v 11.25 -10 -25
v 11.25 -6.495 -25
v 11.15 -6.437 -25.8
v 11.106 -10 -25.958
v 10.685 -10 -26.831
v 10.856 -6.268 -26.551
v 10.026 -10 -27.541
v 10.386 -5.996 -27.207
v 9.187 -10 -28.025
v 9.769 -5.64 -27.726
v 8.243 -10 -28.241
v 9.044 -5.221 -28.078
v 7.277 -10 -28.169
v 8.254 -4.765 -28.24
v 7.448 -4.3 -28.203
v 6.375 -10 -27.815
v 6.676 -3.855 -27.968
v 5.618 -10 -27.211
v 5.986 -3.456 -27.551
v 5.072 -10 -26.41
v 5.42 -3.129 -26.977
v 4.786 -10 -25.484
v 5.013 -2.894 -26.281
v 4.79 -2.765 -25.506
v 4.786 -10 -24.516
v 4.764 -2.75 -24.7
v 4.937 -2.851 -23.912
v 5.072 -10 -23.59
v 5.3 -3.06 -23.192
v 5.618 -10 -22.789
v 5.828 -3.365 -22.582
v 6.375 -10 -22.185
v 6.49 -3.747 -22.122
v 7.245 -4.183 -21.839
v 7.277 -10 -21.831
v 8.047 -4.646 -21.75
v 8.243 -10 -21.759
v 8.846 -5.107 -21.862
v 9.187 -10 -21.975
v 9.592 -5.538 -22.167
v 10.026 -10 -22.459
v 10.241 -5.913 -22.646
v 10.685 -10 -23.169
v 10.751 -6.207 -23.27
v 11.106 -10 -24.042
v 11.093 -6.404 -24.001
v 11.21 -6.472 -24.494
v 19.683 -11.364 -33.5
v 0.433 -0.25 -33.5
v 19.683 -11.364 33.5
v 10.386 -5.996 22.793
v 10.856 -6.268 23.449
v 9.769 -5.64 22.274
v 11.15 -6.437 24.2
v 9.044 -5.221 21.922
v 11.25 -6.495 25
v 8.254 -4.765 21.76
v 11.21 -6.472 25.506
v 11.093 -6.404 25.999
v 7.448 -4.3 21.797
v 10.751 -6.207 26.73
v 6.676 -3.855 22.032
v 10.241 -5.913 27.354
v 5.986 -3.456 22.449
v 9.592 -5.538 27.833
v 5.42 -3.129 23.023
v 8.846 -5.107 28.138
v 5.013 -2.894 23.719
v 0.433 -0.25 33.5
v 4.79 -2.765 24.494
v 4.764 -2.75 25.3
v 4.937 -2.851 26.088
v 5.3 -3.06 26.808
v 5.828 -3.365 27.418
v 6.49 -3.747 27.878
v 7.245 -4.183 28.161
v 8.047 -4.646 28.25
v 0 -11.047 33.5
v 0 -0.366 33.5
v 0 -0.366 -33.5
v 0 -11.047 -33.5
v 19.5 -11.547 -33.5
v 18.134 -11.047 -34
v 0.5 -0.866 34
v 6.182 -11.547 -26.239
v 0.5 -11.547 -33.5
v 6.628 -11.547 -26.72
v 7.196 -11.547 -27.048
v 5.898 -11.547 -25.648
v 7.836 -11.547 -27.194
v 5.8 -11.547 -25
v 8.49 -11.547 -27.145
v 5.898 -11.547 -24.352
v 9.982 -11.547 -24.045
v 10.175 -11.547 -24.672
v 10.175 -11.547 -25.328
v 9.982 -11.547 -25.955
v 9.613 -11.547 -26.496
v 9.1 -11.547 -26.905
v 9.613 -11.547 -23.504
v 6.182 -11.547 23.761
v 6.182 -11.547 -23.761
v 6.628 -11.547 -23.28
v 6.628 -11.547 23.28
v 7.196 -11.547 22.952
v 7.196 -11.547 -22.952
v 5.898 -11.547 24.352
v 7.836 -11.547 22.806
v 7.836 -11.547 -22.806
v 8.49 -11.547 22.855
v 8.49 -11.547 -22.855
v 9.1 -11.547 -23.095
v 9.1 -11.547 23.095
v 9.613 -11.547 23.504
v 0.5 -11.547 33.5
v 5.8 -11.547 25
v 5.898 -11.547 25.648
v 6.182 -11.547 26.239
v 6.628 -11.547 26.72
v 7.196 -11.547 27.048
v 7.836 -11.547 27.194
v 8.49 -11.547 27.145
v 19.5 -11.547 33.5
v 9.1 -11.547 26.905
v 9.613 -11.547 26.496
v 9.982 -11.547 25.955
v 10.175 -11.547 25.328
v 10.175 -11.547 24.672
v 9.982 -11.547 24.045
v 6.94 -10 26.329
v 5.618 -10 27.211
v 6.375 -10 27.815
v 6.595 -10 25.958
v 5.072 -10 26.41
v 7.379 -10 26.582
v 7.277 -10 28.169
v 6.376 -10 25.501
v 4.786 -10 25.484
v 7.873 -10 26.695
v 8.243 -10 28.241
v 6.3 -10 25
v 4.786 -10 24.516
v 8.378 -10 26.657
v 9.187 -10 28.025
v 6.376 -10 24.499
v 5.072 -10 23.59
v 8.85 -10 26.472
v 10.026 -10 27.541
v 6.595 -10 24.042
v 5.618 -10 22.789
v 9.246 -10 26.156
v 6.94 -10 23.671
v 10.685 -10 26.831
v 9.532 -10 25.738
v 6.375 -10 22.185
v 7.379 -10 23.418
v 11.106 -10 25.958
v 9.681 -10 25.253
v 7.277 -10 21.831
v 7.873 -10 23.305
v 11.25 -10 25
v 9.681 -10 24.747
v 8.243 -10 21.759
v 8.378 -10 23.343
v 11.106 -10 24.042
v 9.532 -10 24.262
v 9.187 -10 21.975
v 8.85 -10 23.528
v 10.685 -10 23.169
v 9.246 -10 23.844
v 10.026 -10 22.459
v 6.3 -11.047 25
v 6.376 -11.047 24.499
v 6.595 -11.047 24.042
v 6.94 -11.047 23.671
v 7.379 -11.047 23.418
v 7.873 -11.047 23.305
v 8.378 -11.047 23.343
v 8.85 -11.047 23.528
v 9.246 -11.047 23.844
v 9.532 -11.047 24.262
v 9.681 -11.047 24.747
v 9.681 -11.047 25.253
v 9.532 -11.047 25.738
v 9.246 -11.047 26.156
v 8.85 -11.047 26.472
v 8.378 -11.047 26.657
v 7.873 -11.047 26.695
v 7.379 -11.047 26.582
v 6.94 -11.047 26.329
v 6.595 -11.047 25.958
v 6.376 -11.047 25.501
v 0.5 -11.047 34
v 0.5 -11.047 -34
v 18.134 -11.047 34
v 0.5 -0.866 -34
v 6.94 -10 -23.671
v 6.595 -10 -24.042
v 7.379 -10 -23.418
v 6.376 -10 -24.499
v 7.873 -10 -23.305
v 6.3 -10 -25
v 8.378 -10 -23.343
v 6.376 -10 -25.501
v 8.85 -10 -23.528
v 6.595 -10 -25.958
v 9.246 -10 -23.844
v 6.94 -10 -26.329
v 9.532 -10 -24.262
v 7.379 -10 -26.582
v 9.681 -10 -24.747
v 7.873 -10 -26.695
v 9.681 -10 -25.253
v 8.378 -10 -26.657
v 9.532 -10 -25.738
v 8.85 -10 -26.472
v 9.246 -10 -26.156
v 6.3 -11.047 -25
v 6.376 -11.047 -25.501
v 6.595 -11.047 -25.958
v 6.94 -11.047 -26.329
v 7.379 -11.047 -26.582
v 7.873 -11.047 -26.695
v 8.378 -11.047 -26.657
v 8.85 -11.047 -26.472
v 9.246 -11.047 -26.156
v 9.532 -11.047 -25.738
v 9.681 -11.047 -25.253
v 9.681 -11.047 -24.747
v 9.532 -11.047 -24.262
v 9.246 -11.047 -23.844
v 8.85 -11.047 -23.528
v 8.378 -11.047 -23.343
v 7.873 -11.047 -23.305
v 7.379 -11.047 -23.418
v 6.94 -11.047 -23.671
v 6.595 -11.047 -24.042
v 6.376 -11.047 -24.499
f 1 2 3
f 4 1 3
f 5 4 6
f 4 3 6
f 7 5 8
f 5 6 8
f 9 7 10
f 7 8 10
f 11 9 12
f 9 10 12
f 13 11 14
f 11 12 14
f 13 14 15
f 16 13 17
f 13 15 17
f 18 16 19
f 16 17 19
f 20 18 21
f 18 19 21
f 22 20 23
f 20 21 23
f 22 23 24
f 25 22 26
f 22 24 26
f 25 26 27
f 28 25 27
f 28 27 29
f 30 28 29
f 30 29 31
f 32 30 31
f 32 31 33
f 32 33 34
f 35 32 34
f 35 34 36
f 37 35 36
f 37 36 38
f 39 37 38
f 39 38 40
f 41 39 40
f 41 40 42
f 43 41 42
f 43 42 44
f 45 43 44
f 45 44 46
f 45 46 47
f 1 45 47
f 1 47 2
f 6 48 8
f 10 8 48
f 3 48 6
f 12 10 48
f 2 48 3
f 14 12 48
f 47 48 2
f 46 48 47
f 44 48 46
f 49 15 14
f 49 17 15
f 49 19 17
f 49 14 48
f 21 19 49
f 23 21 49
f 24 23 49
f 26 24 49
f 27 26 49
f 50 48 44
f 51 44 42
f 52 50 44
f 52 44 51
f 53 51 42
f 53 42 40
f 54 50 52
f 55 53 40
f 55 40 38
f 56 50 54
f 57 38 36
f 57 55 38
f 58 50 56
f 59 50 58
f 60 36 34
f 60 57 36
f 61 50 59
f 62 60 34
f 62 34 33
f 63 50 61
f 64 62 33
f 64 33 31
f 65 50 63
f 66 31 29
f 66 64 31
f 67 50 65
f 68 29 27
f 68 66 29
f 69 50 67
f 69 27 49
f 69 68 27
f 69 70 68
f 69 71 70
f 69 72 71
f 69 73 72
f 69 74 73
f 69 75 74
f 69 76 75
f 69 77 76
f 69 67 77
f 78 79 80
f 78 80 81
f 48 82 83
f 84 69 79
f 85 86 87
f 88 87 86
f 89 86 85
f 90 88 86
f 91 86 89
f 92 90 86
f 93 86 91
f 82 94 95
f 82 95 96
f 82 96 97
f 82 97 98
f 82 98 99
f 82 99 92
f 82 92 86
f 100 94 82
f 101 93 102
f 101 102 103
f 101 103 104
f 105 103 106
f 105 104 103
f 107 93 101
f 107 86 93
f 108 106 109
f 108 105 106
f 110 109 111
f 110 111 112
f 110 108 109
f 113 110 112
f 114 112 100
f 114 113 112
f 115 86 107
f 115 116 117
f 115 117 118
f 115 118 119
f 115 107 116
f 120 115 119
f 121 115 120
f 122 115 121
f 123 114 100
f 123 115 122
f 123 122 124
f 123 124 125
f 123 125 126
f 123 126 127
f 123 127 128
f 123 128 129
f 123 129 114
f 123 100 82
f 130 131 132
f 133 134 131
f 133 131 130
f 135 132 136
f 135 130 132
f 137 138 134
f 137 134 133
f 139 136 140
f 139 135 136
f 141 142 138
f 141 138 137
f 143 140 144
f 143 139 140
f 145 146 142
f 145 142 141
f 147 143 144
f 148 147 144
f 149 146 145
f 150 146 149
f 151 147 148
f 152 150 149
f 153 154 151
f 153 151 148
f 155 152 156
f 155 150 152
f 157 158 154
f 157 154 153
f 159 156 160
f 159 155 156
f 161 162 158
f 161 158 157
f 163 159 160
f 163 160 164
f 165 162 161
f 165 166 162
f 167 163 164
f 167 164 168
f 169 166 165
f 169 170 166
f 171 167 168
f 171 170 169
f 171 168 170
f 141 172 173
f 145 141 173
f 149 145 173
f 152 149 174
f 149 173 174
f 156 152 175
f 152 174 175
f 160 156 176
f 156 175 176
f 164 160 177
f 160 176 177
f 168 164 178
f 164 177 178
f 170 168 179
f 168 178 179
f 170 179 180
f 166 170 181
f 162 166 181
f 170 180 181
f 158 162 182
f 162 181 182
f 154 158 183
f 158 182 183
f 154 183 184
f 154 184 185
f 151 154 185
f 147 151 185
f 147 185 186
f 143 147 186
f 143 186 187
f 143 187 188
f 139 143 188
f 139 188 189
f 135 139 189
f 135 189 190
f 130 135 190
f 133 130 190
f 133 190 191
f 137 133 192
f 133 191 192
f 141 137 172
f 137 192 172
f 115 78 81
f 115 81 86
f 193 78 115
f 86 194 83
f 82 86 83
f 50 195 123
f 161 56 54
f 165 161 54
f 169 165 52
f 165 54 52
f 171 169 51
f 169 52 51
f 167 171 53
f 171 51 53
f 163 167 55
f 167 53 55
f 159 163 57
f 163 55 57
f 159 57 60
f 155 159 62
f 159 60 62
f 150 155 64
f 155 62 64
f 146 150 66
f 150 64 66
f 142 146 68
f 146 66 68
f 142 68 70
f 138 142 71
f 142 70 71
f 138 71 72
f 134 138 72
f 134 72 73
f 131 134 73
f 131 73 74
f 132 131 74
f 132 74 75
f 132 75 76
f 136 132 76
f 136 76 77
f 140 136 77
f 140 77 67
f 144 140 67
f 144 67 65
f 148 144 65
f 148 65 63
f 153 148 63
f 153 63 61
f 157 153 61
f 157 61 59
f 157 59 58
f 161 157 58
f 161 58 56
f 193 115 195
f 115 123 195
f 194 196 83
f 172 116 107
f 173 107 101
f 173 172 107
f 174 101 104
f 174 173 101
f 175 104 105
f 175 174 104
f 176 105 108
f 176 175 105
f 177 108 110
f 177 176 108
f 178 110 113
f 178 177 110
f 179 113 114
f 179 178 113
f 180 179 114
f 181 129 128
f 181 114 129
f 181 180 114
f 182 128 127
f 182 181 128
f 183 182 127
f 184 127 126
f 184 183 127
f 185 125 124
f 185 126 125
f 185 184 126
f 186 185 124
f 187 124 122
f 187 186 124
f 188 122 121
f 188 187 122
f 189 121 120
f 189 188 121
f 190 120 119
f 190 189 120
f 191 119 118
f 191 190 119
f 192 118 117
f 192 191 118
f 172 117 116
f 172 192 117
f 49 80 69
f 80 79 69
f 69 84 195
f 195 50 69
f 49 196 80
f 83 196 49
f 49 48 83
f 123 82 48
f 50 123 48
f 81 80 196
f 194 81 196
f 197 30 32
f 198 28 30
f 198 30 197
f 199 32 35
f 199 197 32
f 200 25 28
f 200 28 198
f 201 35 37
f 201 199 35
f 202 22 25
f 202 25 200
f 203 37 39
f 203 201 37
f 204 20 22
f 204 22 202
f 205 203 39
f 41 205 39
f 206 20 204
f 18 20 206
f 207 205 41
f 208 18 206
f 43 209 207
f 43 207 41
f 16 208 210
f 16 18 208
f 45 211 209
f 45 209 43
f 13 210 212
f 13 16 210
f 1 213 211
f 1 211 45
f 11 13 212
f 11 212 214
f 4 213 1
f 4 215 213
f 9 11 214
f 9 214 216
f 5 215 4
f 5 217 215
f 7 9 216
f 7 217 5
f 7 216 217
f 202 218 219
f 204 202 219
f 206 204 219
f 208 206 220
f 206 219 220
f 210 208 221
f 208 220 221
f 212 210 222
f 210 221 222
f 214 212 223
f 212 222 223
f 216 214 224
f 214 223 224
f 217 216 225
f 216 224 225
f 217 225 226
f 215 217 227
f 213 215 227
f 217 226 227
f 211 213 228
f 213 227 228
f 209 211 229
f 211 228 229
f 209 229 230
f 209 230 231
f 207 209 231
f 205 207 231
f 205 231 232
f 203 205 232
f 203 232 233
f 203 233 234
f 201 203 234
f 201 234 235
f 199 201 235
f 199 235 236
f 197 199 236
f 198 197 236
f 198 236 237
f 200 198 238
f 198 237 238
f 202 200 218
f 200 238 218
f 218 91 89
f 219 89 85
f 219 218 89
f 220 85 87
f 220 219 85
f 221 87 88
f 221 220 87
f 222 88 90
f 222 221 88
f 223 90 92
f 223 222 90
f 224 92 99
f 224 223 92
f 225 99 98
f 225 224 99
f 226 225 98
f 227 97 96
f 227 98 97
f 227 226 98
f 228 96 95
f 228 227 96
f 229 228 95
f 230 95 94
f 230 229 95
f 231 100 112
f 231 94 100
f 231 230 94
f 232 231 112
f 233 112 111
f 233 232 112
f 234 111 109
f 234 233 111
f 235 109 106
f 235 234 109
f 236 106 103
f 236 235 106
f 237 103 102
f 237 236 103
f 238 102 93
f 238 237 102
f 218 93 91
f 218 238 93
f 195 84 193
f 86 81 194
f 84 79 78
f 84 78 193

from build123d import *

# Parameters (mm, degrees)
BOSS_EXTRUDE1_DEPTH                                 = 34
CBORE_FOR_M3_HEX_SOCKET_HEAD_CAP_SCREW1_D           = 3.4
CBORE_FOR_M3_HEX_SOCKET_HEAD_CAP_SCREW1_CBORE_D     = 6.5
CBORE_FOR_M3_HEX_SOCKET_HEAD_CAP_SCREW1_CBORE_DEPTH = 10


with BuildPart() as part:
    # Sketch1 → Boss-Extrude1 (new, symmetric)
    with BuildSketch(Plane.XY):
        Polygon((0, 0), (0, -11.547005384), (20, -11.547005384), align=None)
    extrude(amount=BOSS_EXTRUDE1_DEPTH, both=True)

    # CBORE for M3 Hex Socket Head Cap Screw1 (through all)
    with Locations(Plane(origin=(0, 0, 0), x_dir=(1, 0, 0), z_dir=(0, 1, 0))):
        with Locations((8, -25), (8, 25)):
            CounterBoreHole(CBORE_FOR_M3_HEX_SOCKET_HEAD_CAP_SCREW1_D / 2, CBORE_FOR_M3_HEX_SOCKET_HEAD_CAP_SCREW1_CBORE_D / 2, CBORE_FOR_M3_HEX_SOCKET_HEAD_CAP_SCREW1_CBORE_DEPTH)

    # Chamfer1
    # the kernel refuses this chamfer: 0.5, 0.366025404 mm, written as the material it takes off along each edge
    with BuildSketch(Plane(origin=(0.333333333, -11.21367205, 33.666666667), x_dir=(0.7071067811865475, -0.7071067811865476, 0), z_dir=(-0.5773502691896258, -0.5773502691896257, 0.5773502691896256)), Plane(origin=(0.333333333, -11.21367205, -33.666666667), x_dir=(0.7071067811865474, 0, -0.7071067811865476), z_dir=(-0.5773502691896258, -0.5773502691896257, -0.5773502691896257))) as chamfer1_piece_1:
        Polygon((-0.353553391, -0.204124145), (0.353553391, -0.204124145), (0, 0.40824829), align=None)
    extrude(amount=0.635085296, mode=Mode.SUBTRACT)
    with BuildSketch(Plane(origin=(19.105662433, -11.319334483, 33.666666667), x_dir=(-0.8880738339771186, 0.3250575836718637, 0.3250575836718637), z_dir=(0.25056280708572953, -0.2505628070857271, 0.9351131265310311))) as chamfer1_piece_2:
        Polygon((-0.478383292, 0.07914139), (1.059805709, 0.07914139), (-0.581422417, -0.15828278), align=None)
    extrude(amount=0.652121763, mode=Mode.SUBTRACT)
    with BuildSketch(Plane(origin=(19.105662433, -11.319334483, -33.666666667), x_dir=(0.8880738339771186, -0.3250575836718637, 0.3250575836718637), z_dir=(0.25056280708572953, -0.2505628070857271, -0.9351131265310311))) as chamfer1_piece_3:
        Polygon((-1.059805709, 0.07914139), (0.478383292, 0.07914139), (0.581422417, -0.15828278), align=None)
    extrude(amount=0.652121763, mode=Mode.SUBTRACT)
    with BuildSketch(Plane(origin=(0.311004234, -0.494016936, -33.666666667), x_dir=(0.5773502691896288, -0.5773502691896194, -0.5773502691896291), z_dir=(-0.16369153687076843, 0.6109051323707225, -0.7745966692414806))) as chamfer1_piece_4:
        Polygon((-0.349679369, 0.136409614), (0.516346035, 0.136409614), (-0.166666667, -0.272819228), align=None)
    extrude(amount=0.671995646, mode=Mode.SUBTRACT)
    with BuildSketch(Plane(origin=(0.311004234, -0.494016936, 33.666666667), x_dir=(0.5773502691896286, -0.5773502691896196, 0.5773502691896291), z_dir=(-0.1636915368707684, 0.6109051323707224, 0.7745966692414807))) as chamfer1_piece_5:
        Polygon((-0.349679369, -0.136409614), (0.516346035, -0.136409614), (-0.166666667, 0.272819228), align=None)
    extrude(amount=0.671995646, mode=Mode.SUBTRACT)
    with BuildSketch(Plane(origin=(-1.285841494, -11.547005384, 34), x_dir=(0, -0.02749587661058574, -0.9996219169112968), z_dir=(1, 0, 0)), Plane(origin=(-1.285841494, -11.547005384, -34), x_dir=(0, 0.999621916911297, -0.0274958766105822), z_dir=(1, 0, 0))) as chamfer1_piece_6:
        with BuildLine():
            Line((0.514336598, 0), (-0.028273577, 0.513558897))
            Line((-0.028273577, 0.513558897), (-0.038269797, 0.513283938))
            ThreePointArc((-0.038269797, 0.513283938), (-0.017064614, 0.256698915), (-0.009996219, -0.000274959))
            Line((-0.009996219, -0.000274959), (0.000274959, -0.009996219))
            ThreePointArc((0.000274959, -0.009996219), (0.257248832, -0.002927825), (0.514611556, -0.009996219))
            Line((0.514611556, -0.009996219), (0.514336598, 0))
        make_face()
    extrude(amount=22.571682988, mode=Mode.SUBTRACT)
    with BuildSketch(Plane(origin=(8, -11.547005384, -25), x_dir=(-1, 0, 0), z_dir=(0, 0, 1))) as chamfer1_piece_7:
        with BuildLine():
            Line((2.214142136, 0.014142136), (1.685857864, -0.514142136))
            Line((1.685857864, -0.514142136), (1.675857864, -0.514142136))
            ThreePointArc((1.675857864, -0.514142136), (1.69, -0.257071068), (1.69, 0))
            Line((1.69, 0), (1.7, 0.01))
            ThreePointArc((1.7, 0.01), (1.957071068, 0.01), (2.214142136, 0.024142136))
            Line((2.214142136, 0.024142136), (2.214142136, 0.014142136))
        make_face()
    revolve(axis=Axis((8, -11.547005384, -25), (0, -1, 0)), mode=Mode.SUBTRACT)
    with BuildSketch(Plane(origin=(8, -11.547005384, 25), x_dir=(-1, 0, 0), z_dir=(0, 0, 1))) as chamfer1_piece_8:
        with BuildLine():
            Line((2.214142136, 0.014142136), (1.685857864, -0.514142136))
            Line((1.685857864, -0.514142136), (1.675857864, -0.514142136))
            ThreePointArc((1.675857864, -0.514142136), (1.69, -0.257071068), (1.69, 0))
            Line((1.69, 0), (1.7, 0.01))
            ThreePointArc((1.7, 0.01), (1.957071068, 0.01), (2.214142136, 0.024142136))
            Line((2.214142136, 0.024142136), (2.214142136, 0.014142136))
        make_face()
    revolve(axis=Axis((8, -11.547005384, 25), (0, -1, 0)), mode=Mode.SUBTRACT)
    with BuildSketch(Plane(origin=(0, 1.285841494, -34), x_dir=(-0.027495876610586483, 0, 0.9996219169112968), z_dir=(0, -1, 0))) as chamfer1_piece_9:
        with BuildLine():
            Line((0.514336598, 0), (-0.028273577, -0.513558897))
            Line((-0.028273577, -0.513558897), (-0.038269797, -0.513283938))
            ThreePointArc((-0.038269797, -0.513283938), (-0.017064614, -0.256698915), (-0.009996219, 0.000274959))
            Line((-0.009996219, 0.000274959), (0.000274959, 0.009996219))
            ThreePointArc((0.000274959, 0.009996219), (0.257248832, 0.002927825), (0.514611556, 0.009996219))
            Line((0.514611556, 0.009996219), (0.514336598, 0))
        make_face()
    extrude(amount=14.118688372, mode=Mode.SUBTRACT)
    with BuildSketch(Plane(origin=(21.113571399, -12.189926131, -34), x_dir=(-0.4998109584556428, -0.8656979742248838, -0.027495876610582233), z_dir=(-0.8660254037844419, 0.4999999999999943, 0))) as chamfer1_piece_10:
        with BuildLine():
            Line((0.514336598, 0), (-0.028273577, 0.513558897))
            Line((-0.028273577, 0.513558897), (-0.038269797, 0.513283938))
            ThreePointArc((-0.038269797, 0.513283938), (-0.017064614, 0.256698915), (-0.009996219, -0.000274959))
            Line((-0.009996219, -0.000274959), (0.000274959, -0.009996219))
            ThreePointArc((0.000274959, -0.009996219), (0.257248832, -0.002927825), (0.514611556, -0.009996219))
            Line((0.514611556, -0.009996219), (0.514336598, 0))
        make_face()
    extrude(amount=25.665693756, mode=Mode.SUBTRACT)
    with BuildSketch(Plane(origin=(21.113571399, -12.189926131, 34), x_dir=(-0.4998109584556428, -0.8656979742248838, 0.027495876610582233), z_dir=(-0.8660254037844419, 0.4999999999999943, 0))) as chamfer1_piece_11:
        with BuildLine():
            Line((0.514336598, 0), (-0.028273577, -0.513558897))
            Line((-0.028273577, -0.513558897), (-0.038269797, -0.513283938))
            ThreePointArc((-0.038269797, -0.513283938), (-0.017064614, -0.256698915), (-0.009996219, 0.000274959))
            Line((-0.009996219, 0.000274959), (0.000274959, 0.009996219))
            ThreePointArc((0.000274959, 0.009996219), (0.257248832, 0.002927825), (0.514611556, 0.009996219))
            Line((0.514611556, 0.009996219), (0.514336598, 0))
        make_face()
    extrude(amount=25.665693756, mode=Mode.SUBTRACT)
    with BuildSketch(Plane(origin=(0, -11.547005384, -35.285841494), x_dir=(-0.02749587661058639, 0.9996219169112968, 0), z_dir=(0, 0, 1))) as chamfer1_piece_12:
        with BuildLine():
            Line((0.514336598, 0), (-0.028273577, -0.513558897))
            Line((-0.028273577, -0.513558897), (-0.038269797, -0.513283938))
            ThreePointArc((-0.038269797, -0.513283938), (-0.017064614, -0.256698915), (-0.009996219, 0.000274959))
            Line((-0.009996219, 0.000274959), (0.000274959, 0.009996219))
            ThreePointArc((0.000274959, 0.009996219), (0.257248832, 0.002927825), (0.514611556, 0.009996219))
            Line((0.514611556, 0.009996219), (0.514336598, 0))
        make_face()
    extrude(amount=70.571682988, mode=Mode.SUBTRACT)
    with BuildSketch(Plane(origin=(0, 1.285841494, 34), x_dir=(-0.027495876610586483, 0, -0.9996219169112968), z_dir=(0, -1, 0))) as chamfer1_piece_13:
        with BuildLine():
            Line((0.514336598, 0), (-0.028273577, 0.513558897))
            Line((-0.028273577, 0.513558897), (-0.038269797, 0.513283938))
            ThreePointArc((-0.038269797, 0.513283938), (-0.017064614, 0.256698915), (-0.009996219, -0.000274959))
            Line((-0.009996219, -0.000274959), (0.000274959, -0.009996219))
            ThreePointArc((0.000274959, -0.009996219), (0.257248832, -0.002927825), (0.514611556, -0.009996219))
            Line((0.514611556, -0.009996219), (0.514336598, 0))
        make_face()
    extrude(amount=14.118688372, mode=Mode.SUBTRACT)
    with BuildSketch(Plane(origin=(20, -11.547005384, 35.285841494), x_dir=(-0.9996219169112968, -0.02749587661058555, 0), z_dir=(0, 0, -1))) as chamfer1_piece_14:
        with BuildLine():
            Line((0.514336598, 0), (0.297309717, 0.20540729))
            Line((0.297309717, 0.20540729), (0.292073486, 0.21392679))
            ThreePointArc((0.292073486, 0.21392679), (0.148476438, 0.10299394), (-0.005236231, 0.0085195))
            Line((-0.005236231, 0.0085195), (0.000274959, -0.009996219))
            ThreePointArc((0.000274959, -0.009996219), (0.257248832, -0.002927825), (0.514611556, -0.009996219))
            Line((0.514611556, -0.009996219), (0.514336598, 0))
        make_face()
    extrude(amount=70.571682988, mode=Mode.SUBTRACT)
    with BuildSketch(Plane(origin=(0, 0, 35.285841494), x_dir=(-0.05197283076278021, -0.9986484991539833, 0), z_dir=(0, 0, -1))) as chamfer1_piece_15:
        with BuildLine():
            Line((0.371704143, 0), (0.220983806, -0.464444069))
            Line((0.220983806, -0.464444069), (0.212075392, -0.468987213))
            ThreePointArc((0.212075392, -0.468987213), (0.107882689, -0.233552691), (-0.008908414, -0.004543145))
            Line((-0.008908414, -0.004543145), (0.000519728, 0.009986485))
            ThreePointArc((0.000519728, 0.009986485), (0.185869781, 0.000340281), (0.372223871, 0.009986485))
            Line((0.372223871, 0.009986485), (0.371704143, 0))
        make_face()
    extrude(amount=70.571682988, mode=Mode.SUBTRACT)


solid = part.part
